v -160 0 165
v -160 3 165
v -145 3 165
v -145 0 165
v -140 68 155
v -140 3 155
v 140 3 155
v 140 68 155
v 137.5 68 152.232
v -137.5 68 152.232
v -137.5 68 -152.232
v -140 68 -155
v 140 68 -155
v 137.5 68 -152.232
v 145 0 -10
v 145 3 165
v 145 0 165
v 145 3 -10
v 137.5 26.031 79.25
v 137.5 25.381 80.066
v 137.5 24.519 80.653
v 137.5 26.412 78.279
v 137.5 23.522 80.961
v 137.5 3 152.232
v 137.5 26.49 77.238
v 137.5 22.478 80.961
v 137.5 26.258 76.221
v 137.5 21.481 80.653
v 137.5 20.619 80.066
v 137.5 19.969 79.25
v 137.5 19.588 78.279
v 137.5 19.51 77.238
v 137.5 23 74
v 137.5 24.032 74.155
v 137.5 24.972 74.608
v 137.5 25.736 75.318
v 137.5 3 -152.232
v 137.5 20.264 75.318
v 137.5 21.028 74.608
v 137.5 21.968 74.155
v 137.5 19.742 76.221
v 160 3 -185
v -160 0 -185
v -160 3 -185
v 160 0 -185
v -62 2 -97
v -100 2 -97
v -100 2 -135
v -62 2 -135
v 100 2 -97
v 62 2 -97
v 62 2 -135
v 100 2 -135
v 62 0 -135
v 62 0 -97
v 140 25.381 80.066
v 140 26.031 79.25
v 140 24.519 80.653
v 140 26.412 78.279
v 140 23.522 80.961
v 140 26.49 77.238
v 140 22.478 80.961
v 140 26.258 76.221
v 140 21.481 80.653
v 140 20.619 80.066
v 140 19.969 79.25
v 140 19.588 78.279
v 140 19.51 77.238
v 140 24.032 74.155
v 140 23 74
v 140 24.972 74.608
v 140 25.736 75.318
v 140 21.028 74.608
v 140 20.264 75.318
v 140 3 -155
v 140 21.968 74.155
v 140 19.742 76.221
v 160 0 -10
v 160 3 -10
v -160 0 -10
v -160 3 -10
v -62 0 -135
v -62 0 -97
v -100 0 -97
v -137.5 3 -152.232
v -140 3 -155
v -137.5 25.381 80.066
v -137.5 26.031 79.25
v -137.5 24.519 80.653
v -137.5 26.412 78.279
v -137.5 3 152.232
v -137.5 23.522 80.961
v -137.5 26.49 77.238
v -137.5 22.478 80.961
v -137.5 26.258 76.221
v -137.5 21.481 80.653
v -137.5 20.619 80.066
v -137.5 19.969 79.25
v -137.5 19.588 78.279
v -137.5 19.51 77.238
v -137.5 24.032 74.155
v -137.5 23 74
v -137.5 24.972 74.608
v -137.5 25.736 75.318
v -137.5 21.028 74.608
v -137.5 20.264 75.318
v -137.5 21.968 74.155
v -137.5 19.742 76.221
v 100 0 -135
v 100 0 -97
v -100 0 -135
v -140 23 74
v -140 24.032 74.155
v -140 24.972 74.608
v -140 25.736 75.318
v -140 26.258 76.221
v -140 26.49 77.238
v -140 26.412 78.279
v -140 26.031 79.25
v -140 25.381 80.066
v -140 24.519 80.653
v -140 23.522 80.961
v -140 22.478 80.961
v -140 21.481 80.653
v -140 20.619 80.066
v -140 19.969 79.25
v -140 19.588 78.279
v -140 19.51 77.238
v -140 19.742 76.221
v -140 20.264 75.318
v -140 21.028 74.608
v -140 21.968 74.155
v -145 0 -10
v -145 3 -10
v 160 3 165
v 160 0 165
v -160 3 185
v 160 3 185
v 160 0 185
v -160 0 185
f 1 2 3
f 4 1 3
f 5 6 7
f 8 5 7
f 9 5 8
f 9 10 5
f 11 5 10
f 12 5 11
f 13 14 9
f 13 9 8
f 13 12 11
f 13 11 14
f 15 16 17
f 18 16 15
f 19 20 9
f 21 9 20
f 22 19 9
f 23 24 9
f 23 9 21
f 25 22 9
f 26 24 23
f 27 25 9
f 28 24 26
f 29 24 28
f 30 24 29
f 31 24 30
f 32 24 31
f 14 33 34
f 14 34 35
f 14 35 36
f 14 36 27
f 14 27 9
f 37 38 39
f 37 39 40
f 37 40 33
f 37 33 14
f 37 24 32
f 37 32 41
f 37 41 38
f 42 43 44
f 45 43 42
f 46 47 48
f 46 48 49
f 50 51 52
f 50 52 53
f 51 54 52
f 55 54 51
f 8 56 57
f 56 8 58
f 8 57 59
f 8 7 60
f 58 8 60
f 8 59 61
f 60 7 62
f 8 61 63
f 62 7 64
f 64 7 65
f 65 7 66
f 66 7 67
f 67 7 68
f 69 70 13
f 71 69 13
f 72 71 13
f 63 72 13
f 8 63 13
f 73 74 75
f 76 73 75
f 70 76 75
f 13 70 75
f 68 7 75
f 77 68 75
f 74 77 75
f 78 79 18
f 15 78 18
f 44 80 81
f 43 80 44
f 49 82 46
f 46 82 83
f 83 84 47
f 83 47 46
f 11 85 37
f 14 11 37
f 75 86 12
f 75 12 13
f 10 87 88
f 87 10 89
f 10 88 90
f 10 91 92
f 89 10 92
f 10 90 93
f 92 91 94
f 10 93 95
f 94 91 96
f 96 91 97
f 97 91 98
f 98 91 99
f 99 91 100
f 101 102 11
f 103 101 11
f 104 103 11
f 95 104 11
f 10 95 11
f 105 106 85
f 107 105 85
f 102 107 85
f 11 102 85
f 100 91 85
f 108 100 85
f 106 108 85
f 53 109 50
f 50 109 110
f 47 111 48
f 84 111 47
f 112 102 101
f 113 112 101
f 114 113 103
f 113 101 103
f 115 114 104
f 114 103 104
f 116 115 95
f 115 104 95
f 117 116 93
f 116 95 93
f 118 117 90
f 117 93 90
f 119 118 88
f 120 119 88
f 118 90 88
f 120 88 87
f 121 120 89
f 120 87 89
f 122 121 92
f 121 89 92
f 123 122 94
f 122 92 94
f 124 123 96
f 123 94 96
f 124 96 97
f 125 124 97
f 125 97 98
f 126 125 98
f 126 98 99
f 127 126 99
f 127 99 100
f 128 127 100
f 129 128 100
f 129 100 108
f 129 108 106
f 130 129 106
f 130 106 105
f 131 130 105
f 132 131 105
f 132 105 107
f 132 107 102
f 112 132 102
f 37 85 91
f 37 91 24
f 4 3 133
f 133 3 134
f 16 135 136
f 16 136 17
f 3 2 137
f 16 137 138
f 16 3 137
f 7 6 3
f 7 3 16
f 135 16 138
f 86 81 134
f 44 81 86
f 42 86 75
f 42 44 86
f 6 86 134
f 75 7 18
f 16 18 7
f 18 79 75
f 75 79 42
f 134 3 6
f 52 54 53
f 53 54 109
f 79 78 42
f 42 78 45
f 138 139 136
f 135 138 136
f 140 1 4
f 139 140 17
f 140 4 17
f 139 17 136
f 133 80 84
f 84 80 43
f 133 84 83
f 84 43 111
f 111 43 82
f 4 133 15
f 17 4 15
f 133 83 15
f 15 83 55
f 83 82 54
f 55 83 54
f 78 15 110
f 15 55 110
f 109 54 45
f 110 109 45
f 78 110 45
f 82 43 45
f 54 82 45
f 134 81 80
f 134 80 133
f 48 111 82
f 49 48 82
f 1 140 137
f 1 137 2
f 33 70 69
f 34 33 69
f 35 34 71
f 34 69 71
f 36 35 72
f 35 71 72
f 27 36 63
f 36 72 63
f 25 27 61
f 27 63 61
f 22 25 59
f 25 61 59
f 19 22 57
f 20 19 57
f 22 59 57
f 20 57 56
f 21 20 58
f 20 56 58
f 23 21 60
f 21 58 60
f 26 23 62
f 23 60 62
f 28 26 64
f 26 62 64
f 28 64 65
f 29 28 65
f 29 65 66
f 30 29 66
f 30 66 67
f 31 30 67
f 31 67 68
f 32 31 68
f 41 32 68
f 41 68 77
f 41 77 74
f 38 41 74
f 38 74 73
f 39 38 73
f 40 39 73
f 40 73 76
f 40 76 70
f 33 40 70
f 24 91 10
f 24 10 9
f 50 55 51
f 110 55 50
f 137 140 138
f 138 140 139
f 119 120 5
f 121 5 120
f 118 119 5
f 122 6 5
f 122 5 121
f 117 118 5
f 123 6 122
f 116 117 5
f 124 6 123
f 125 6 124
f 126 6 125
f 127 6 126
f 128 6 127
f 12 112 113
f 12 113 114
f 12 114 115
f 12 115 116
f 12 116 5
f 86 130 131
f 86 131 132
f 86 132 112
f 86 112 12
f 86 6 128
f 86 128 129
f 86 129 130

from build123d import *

# Parameters (mm, degrees)
SKETCH1_W           = 320
SKETCH1_H           = 370
BOSS_EXTRUDE1_DEPTH = 3
SKETCH2_W           = 280
SKETCH2_H           = 310
SKETCH2_W_2         = 275
SKETCH2_H_2         = 304.464285714
BOSS_EXTRUDE2_DEPTH = 65
SKETCH4_W           = 15
SKETCH4_H           = 175
CUT_EXTRUDE2_DEPTH  = 40
SKETCH5_R           = 3.5
CUT_EXTRUDE3_DEPTH  = 359.955428988
SKETCH6_W           = 38
SKETCH6_H           = 38
CUT_EXTRUDE5_DEPTH  = 2


with BuildPart() as part:
    # Sketch1 → Boss-Extrude1 (new body)
    with BuildSketch(Plane(origin=(0, 0, 0), x_dir=(1, 0, 0), z_dir=(0, 1, 0))):
        Rectangle(SKETCH1_W, SKETCH1_H)
    extrude(amount=BOSS_EXTRUDE1_DEPTH)

    # Sketch2 → Boss-Extrude2 (add)
    with BuildSketch(Plane(origin=(0, 3, 0), x_dir=(1, 0, 0), z_dir=(0, 1, 0))):
        Rectangle(SKETCH2_W, SKETCH2_H)
        Rectangle(SKETCH2_W_2, SKETCH2_H_2, mode=Mode.SUBTRACT)
    extrude(amount=BOSS_EXTRUDE2_DEPTH)

    # Sketch4 → Cut-Extrude2 (cut)
    with BuildSketch(Plane(origin=(0, 3, 0), x_dir=(1, 0, 0), z_dir=(0, 1, 0))):
        with Locations((-152.5, -77.5)):
            Rectangle(SKETCH4_W, SKETCH4_H)
    cut_extrude2 = extrude(amount=-CUT_EXTRUDE2_DEPTH, mode=Mode.SUBTRACT)

    # Mirror3: Cut-Extrude2 across plane
    add(cut_extrude2.mirror(Plane(origin=(0, 0, 0), x_dir=(0, 0, 1), z_dir=(1, 0, 0))), mode=Mode.SUBTRACT)

    # Sketch5 → Cut-Extrude3 (cut, through all)
    with BuildSketch(Plane(origin=(140, 0, 0), x_dir=(0, 0, -1), z_dir=(1, 0, 0))):
        with Locations((-77.5, 23)):
            Circle(SKETCH5_R)
    extrude(amount=-CUT_EXTRUDE3_DEPTH, mode=Mode.SUBTRACT)

    # Sketch6 → Cut-Extrude5 (cut)
    with BuildSketch(Plane.XZ):
        with Locations((-81, -116)):
            Rectangle(SKETCH6_W, SKETCH6_H)
        with Locations((81, -116)):
            Rectangle(SKETCH6_W, SKETCH6_H)
    extrude(amount=-CUT_EXTRUDE5_DEPTH, mode=Mode.SUBTRACT)


solid = part.part
